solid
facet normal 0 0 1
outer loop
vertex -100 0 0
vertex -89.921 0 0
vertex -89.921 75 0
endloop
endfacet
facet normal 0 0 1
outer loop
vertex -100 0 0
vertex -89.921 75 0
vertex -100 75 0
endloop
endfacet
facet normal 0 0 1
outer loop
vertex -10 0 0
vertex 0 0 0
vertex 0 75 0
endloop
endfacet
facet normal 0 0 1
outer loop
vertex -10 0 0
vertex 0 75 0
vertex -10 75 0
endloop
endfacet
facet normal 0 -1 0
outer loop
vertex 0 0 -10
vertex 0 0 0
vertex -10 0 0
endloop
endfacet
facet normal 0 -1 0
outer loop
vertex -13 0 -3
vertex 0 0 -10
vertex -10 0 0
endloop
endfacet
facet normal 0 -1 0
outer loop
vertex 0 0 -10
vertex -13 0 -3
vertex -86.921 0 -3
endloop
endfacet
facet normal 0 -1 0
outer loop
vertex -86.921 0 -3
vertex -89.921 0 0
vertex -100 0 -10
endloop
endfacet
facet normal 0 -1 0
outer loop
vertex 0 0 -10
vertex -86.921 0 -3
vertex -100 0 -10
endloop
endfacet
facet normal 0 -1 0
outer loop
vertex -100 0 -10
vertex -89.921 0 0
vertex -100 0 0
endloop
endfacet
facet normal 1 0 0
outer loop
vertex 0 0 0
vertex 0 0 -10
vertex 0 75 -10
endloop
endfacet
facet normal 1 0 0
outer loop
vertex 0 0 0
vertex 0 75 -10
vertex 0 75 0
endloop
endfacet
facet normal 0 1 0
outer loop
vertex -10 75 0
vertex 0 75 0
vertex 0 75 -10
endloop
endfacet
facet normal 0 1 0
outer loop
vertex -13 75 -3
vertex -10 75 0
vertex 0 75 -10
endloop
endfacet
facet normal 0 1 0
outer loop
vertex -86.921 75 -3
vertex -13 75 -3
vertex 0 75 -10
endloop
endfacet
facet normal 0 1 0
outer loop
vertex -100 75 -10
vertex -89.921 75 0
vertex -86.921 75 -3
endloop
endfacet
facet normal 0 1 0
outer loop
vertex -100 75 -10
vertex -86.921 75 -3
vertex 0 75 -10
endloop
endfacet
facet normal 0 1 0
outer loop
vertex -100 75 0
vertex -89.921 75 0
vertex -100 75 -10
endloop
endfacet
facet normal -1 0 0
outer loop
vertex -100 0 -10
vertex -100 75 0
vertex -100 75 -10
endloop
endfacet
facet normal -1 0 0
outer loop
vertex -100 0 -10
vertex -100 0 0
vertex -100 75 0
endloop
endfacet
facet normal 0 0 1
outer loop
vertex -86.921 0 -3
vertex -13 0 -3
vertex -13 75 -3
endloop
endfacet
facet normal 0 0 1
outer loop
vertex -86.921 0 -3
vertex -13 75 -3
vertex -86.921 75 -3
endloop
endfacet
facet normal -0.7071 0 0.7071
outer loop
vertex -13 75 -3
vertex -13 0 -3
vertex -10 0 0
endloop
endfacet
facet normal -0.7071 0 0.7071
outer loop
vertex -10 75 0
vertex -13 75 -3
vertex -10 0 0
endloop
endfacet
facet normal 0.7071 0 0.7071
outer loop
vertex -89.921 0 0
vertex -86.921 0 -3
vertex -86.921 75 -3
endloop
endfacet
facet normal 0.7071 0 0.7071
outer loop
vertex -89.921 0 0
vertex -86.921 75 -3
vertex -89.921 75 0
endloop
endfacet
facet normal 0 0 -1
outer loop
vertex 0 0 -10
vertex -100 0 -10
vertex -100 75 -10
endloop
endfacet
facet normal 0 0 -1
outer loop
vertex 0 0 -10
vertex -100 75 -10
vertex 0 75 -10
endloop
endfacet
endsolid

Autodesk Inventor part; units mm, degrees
ref_plane "YZ Plane" through (0, 0, 0) normal (1, 0, 0) x (0, 1, 0)
ref_plane "XZ Plane" through (0, 0, 0) normal (0, 1, 0) x (-1, 0, 0)
ref_plane "XY Plane" through (0, 0, 0) normal (0, 0, 1) x (1, 0, 0)
sketch "Sketch1" plane through (0, 0, 0) normal (0, 1, 0) x (-1, 0, 0)
  line L0 (100, 0) -> (100, -10)
  line L1 (100, -10) -> (0, -10)
  line L2 (0, -10) -> (0, 0)
  line L3 (0, 0) -> (10, 0)
  line L4 (13, -3) -> (10, 0)
  line L5 (86.9207, -3) -> (89.9207, 0)
  line L6 (13, -3) -> (86.9207, -3)
  line L7 (0, 0) -> (10, 0)
  line L8 (89.9207, 0) -> (100, 0)
  point P0 (13, 0)
  point P1 (13, 0)
  point P2 (89.9207, 0)
  point P3 (89.9207, 0)
  point P4 (86.9207, 0)
extrude "Extrusion1" add sketch "Sketch1" along normal blind 75
sketch "Sketch2" plane through (0, 0, -10) normal (0, 0, -1) x (-1, 0, 0)
  line L0 (0, 0) -> (100, 0) projected
  line L1 (100, 0) -> (100, 75) projected
  line L2 (0, 75) -> (100, 75) projected
  line L3 (0, 0) -> (0, 75) projected
properties part number "base" material "Gravel"
